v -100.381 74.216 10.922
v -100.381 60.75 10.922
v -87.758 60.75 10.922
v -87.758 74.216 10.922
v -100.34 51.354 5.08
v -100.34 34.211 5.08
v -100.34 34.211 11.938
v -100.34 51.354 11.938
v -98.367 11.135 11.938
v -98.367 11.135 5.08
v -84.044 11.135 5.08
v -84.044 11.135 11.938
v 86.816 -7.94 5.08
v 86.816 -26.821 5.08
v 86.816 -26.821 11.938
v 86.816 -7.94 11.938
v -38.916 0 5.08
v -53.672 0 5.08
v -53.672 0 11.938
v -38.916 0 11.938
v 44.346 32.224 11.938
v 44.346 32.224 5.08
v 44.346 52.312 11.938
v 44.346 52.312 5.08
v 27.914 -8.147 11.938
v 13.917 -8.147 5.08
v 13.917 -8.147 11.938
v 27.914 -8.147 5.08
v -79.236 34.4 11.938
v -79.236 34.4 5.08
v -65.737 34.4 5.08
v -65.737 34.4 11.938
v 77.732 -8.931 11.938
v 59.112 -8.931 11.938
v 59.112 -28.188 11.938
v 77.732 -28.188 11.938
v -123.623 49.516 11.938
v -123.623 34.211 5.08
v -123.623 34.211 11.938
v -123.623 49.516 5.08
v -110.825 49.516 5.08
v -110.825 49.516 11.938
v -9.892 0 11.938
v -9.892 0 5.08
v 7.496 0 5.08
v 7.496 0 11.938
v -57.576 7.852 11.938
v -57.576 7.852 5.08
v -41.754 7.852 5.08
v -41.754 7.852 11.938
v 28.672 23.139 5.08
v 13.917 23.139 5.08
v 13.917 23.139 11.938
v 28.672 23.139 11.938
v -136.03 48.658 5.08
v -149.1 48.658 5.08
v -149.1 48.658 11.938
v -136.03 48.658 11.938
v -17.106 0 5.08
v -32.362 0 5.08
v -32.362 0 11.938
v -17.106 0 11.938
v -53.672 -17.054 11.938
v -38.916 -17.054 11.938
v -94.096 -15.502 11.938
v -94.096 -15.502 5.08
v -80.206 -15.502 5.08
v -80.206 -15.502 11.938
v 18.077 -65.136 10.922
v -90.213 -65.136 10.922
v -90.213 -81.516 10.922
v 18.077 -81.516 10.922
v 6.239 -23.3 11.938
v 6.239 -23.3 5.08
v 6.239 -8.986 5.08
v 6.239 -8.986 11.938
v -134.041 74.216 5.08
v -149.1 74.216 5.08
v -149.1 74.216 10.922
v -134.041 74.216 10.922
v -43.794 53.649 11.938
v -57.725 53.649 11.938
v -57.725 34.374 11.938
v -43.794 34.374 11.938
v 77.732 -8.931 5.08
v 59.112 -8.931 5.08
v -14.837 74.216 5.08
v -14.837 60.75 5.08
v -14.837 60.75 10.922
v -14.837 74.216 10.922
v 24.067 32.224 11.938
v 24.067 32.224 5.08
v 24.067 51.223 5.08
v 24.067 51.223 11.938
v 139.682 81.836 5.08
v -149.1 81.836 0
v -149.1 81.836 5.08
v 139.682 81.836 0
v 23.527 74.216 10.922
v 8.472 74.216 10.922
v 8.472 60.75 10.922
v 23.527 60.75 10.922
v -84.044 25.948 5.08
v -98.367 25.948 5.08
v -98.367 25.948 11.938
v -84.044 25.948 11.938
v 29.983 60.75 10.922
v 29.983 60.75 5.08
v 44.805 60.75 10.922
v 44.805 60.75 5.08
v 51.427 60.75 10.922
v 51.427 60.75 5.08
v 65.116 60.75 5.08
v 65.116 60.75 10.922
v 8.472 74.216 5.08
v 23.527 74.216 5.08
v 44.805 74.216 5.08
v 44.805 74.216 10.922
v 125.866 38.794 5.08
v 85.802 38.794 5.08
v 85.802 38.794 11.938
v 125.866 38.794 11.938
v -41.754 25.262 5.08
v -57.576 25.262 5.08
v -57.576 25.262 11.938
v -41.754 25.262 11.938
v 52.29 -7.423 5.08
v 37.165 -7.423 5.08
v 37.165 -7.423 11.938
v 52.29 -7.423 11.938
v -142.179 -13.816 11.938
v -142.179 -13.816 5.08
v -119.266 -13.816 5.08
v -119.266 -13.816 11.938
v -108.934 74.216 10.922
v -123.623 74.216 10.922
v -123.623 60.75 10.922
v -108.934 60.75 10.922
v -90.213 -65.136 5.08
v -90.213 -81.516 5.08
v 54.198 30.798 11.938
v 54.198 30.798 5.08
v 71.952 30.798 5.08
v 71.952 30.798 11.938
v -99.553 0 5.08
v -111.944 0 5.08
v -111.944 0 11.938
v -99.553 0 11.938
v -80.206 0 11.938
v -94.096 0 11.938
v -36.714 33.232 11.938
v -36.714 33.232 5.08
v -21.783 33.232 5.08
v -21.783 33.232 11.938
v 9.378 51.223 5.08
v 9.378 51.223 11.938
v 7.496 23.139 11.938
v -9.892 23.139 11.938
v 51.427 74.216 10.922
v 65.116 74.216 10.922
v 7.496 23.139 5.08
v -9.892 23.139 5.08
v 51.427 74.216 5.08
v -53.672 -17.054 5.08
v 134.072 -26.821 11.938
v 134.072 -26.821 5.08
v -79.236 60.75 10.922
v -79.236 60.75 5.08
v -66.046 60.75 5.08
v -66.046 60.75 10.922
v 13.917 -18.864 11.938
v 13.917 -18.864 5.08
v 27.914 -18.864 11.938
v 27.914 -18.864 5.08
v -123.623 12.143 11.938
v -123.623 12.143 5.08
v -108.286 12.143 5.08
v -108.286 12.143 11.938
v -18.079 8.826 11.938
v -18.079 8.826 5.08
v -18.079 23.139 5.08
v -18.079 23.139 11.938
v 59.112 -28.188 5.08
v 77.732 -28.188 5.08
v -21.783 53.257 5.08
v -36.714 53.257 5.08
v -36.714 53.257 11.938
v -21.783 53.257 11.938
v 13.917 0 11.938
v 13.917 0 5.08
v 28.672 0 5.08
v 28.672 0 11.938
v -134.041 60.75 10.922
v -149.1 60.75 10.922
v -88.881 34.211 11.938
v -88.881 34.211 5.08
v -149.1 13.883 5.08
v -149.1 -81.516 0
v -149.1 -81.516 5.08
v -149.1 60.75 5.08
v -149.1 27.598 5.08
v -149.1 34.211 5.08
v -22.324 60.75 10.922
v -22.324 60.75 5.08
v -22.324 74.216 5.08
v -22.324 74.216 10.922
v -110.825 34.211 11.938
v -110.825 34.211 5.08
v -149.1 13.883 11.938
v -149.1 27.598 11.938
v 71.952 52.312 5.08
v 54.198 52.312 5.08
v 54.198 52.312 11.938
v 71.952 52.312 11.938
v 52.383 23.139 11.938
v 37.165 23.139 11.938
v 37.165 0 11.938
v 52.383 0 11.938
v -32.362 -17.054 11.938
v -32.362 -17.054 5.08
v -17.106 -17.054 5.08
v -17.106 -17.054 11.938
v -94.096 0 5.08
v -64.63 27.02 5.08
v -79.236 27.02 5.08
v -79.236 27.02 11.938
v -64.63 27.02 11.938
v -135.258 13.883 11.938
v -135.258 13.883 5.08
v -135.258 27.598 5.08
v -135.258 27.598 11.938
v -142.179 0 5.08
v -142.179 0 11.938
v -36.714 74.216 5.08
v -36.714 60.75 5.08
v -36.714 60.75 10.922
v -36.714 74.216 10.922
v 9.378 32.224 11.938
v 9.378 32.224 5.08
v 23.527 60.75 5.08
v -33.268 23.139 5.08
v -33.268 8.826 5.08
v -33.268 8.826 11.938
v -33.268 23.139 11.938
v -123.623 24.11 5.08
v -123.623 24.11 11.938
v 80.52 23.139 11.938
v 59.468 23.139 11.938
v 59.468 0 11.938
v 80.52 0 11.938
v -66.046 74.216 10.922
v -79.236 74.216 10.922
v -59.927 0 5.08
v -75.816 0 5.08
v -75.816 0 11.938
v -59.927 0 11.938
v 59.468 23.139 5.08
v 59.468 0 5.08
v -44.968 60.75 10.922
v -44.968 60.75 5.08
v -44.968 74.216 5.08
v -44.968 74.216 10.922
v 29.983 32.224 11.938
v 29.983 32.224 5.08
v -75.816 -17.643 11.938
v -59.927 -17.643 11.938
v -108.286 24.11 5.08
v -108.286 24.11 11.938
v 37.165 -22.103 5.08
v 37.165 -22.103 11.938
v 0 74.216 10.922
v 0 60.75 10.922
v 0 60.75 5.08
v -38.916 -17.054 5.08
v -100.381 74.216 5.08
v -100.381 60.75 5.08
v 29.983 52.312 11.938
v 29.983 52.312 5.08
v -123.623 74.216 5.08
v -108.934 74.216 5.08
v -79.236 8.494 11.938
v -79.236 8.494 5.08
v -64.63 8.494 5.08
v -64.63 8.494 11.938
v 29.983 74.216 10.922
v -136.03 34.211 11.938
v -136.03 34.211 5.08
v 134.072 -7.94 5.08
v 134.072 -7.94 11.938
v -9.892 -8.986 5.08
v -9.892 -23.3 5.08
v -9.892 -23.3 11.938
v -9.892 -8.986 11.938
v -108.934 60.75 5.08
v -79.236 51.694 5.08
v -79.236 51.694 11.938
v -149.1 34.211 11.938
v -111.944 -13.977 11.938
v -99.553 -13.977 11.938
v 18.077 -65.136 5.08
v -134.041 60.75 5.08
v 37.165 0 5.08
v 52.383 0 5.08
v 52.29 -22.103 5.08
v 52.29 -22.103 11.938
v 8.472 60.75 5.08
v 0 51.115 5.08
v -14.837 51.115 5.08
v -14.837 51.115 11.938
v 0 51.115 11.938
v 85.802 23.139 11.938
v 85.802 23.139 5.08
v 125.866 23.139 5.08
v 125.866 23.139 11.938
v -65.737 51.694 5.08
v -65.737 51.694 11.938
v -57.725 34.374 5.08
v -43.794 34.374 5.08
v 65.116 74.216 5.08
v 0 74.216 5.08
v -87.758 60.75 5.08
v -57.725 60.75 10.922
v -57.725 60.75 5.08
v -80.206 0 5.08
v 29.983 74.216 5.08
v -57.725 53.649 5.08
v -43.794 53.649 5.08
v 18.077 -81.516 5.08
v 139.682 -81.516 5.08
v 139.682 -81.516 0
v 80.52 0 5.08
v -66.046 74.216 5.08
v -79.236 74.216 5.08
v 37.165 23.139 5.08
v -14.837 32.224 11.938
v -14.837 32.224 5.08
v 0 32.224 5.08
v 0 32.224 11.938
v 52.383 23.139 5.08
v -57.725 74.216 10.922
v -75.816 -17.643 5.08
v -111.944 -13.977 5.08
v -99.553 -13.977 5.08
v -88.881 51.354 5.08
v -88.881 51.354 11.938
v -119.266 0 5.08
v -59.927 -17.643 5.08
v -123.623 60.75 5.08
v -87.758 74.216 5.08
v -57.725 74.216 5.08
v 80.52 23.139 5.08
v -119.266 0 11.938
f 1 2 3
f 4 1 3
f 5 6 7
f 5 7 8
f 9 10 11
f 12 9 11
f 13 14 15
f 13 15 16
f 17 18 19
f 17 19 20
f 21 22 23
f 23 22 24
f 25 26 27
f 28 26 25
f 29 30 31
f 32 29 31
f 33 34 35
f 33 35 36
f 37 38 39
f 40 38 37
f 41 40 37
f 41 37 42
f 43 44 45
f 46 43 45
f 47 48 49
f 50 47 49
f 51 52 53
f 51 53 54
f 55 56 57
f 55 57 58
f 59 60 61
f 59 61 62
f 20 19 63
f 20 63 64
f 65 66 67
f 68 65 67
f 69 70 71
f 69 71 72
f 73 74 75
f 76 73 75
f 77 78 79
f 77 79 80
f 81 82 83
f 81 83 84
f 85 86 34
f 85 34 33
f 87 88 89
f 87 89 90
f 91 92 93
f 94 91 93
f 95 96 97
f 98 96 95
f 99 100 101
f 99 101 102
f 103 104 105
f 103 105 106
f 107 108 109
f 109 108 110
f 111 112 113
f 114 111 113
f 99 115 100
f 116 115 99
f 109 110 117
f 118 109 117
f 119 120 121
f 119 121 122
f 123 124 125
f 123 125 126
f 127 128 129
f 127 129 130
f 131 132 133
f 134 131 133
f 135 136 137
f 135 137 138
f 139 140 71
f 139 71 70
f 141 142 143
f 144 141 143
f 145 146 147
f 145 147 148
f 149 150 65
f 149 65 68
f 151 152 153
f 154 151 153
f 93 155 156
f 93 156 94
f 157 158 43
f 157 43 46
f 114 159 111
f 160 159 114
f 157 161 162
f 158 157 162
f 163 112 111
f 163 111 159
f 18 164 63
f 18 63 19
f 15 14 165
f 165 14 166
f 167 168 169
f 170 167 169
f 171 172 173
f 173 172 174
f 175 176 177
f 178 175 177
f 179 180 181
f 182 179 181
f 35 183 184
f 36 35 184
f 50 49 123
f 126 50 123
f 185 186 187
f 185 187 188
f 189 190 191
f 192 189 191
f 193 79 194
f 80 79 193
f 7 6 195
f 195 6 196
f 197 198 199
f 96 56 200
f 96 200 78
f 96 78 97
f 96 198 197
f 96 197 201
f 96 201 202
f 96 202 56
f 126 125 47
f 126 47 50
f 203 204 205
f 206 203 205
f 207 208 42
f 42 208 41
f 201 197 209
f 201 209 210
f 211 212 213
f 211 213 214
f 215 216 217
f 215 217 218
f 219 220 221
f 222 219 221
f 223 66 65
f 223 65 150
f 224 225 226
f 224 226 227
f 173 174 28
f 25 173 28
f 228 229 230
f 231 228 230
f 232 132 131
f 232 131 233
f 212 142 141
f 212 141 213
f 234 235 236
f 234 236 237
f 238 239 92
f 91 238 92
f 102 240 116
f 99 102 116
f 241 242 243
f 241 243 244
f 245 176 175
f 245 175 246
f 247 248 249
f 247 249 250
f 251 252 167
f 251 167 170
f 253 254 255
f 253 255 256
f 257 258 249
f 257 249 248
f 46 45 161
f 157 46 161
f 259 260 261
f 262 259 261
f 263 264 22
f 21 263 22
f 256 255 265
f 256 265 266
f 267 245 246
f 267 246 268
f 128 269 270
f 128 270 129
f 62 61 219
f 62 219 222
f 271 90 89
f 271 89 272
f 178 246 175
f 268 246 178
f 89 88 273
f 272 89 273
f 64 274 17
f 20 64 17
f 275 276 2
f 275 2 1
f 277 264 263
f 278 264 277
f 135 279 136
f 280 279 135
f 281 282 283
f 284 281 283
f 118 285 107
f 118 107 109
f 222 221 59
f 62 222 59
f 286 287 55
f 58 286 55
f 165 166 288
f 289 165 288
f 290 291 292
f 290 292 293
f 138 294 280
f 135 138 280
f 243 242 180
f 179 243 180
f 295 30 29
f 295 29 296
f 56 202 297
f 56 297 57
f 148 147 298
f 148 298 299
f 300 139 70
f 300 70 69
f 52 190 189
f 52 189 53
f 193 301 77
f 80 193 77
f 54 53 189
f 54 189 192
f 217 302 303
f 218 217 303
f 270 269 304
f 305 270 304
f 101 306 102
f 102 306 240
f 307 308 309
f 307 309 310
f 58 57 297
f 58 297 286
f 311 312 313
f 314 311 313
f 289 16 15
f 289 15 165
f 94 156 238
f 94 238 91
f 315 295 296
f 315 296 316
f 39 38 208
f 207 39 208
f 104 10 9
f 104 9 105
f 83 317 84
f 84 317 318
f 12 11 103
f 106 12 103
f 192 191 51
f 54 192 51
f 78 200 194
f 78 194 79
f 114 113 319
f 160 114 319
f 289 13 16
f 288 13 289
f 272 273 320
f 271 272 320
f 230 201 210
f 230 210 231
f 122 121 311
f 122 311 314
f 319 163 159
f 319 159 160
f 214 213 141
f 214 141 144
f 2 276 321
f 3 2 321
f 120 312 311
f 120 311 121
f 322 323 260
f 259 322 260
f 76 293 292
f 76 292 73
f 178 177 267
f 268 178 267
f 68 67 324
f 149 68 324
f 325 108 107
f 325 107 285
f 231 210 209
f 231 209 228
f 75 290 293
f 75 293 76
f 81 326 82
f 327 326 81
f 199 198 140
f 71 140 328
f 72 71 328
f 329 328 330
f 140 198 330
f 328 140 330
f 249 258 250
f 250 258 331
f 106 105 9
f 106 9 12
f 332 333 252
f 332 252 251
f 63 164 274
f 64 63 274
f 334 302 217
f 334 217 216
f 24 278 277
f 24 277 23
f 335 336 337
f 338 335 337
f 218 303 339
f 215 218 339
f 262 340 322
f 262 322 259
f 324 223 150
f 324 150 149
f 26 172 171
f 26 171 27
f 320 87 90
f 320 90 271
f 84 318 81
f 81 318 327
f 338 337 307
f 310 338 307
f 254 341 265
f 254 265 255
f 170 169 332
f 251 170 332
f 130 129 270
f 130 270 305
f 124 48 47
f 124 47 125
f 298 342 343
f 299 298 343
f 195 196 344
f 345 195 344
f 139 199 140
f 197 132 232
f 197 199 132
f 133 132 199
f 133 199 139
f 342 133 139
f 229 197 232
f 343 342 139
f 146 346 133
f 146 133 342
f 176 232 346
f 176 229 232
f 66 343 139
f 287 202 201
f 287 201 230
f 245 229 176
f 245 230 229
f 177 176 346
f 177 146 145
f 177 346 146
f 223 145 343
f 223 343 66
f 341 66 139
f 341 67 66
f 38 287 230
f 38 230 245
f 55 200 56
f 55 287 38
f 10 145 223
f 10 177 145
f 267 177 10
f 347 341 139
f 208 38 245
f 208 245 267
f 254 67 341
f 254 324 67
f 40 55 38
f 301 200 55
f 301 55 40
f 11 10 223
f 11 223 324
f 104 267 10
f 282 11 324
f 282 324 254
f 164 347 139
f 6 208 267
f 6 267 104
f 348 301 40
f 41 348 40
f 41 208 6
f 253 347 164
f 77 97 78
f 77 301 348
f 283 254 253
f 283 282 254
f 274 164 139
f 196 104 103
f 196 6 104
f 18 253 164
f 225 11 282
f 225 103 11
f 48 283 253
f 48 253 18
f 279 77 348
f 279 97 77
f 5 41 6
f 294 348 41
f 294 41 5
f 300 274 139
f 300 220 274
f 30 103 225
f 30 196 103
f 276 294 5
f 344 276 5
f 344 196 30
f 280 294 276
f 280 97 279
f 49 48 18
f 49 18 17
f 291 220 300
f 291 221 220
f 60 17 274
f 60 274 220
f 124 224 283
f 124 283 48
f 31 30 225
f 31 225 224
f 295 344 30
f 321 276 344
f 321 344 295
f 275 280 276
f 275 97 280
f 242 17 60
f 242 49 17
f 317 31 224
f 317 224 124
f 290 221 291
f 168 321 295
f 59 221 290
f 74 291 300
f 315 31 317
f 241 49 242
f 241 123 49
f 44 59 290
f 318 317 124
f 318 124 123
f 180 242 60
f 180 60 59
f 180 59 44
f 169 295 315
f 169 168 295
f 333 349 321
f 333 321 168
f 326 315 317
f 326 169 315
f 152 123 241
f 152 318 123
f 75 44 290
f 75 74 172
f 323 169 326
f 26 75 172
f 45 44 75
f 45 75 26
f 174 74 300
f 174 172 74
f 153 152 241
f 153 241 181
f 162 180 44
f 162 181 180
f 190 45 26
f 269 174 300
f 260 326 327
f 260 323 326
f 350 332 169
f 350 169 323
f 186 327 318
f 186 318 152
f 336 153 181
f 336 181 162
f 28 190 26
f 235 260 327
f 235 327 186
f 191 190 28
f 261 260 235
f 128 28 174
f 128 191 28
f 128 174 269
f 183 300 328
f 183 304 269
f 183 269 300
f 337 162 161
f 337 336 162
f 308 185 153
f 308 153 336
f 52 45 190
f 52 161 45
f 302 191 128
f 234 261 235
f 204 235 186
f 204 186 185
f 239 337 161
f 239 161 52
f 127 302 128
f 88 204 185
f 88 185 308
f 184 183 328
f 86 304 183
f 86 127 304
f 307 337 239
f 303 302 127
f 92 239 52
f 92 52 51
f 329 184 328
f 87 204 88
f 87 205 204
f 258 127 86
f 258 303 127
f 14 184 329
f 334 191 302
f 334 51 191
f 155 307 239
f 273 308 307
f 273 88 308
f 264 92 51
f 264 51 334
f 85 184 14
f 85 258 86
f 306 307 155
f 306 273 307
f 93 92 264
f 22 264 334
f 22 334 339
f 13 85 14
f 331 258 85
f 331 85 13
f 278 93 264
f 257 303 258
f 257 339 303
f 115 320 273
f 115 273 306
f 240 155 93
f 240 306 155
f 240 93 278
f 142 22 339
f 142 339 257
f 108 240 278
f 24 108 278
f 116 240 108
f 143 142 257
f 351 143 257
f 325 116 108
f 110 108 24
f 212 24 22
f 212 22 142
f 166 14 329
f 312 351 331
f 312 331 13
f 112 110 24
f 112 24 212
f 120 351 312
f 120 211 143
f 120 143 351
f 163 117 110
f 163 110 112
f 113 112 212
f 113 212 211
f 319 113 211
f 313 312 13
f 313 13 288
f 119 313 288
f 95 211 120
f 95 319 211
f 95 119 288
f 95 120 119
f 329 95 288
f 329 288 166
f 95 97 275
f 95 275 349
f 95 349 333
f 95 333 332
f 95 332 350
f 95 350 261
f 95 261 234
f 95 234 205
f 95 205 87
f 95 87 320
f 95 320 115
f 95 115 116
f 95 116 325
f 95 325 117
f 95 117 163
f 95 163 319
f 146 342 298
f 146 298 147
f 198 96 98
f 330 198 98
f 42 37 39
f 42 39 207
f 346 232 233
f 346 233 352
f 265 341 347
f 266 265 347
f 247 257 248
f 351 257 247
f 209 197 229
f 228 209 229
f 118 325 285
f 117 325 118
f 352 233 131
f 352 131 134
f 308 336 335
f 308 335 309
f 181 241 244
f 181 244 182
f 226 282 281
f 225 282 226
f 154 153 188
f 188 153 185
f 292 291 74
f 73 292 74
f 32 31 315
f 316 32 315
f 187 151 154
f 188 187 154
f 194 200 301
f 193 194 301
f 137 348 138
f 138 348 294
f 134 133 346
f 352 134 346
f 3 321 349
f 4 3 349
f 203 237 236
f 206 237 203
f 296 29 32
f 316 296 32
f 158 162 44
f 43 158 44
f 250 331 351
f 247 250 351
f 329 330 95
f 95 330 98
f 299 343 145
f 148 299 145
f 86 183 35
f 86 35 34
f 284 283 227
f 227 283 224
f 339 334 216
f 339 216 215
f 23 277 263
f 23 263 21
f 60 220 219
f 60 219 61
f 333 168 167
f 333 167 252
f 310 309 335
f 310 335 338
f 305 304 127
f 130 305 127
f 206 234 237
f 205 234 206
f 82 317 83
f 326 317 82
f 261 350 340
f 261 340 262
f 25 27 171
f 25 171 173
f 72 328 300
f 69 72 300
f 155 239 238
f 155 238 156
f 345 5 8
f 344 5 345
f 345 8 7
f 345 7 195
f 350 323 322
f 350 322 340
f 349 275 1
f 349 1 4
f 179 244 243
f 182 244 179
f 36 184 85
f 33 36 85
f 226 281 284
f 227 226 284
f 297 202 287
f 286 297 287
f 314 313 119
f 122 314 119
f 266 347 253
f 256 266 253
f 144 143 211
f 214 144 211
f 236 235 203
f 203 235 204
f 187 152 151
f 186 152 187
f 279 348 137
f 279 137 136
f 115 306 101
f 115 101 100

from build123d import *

# Parameters (mm, degrees)
F0_W     = 288.782075
F0_H     = 163.352266
F1_DEPTH = 5.08
F2_W     = 15.059188
F2_H     = 13.465754
F2_W_2   = 14.688864
F2_W_3   = 12.622907
F2_W_4   = 13.189614
F2_W_5   = 12.756806
F2_W_6   = 14.389988
F2_W_7   = 14.837095
F2_W_8   = 15.054709
F2_W_9   = 14.822775
F2_W_10  = 13.689365
F3_DEPTH = 5.842
F4_W     = 108.290506
F4_H     = 16.379602
F5_DEPTH = 5.842
F6_W     = 13.069794
F6_H     = 14.447321
F6_W_2   = 12.797505
F6_H_2   = 15.304588
F6_W_3   = 11.458419
F6_H_3   = 17.143417
F6_W_4   = 13.49812
F6_H_4   = 17.293982
F6_W_5   = 13.930906
F6_H_5   = 19.27505
F6_W_6   = 14.930427
F6_H_6   = 20.024683
F6_W_7   = 14.837095
F6_H_7   = 18.891268
F6_W_8   = 14.688871
F6_H_8   = 18.99891
F6_W_9   = 14.363708
F6_H_9   = 20.088118
F6_W_10  = 17.754339
F6_H_10  = 21.514323
F6_W_11  = 13.842166
F6_H_11  = 13.715633
F6_W_12  = 15.336946
F6_H_12  = 11.966504
F6_W_13  = 14.323011
F6_H_13  = 14.813163
F6_W_14  = 14.605261
F6_H_14  = 18.525428
F6_W_15  = 15.82228
F6_H_15  = 17.409948
F6_W_16  = 15.188619
F6_H_16  = 14.313415
F6_W_17  = 22.91315
F6_H_17  = 13.81641
F6_W_18  = 9.892102
F6_H_18  = 16.320752
F6_W_19  = 14.755823
F6_H_19  = 23.138981
F6_W_20  = 15.218579
F6_W_21  = 21.051738
F6_W_22  = 40.063784
F6_H_20  = 15.655063
F6_W_23  = 47.256365
F6_H_21  = 18.881655
F6_W_24  = 12.390971
F6_H_22  = 13.976591
F6_W_25  = 13.890229
F6_H_23  = 15.502113
F6_W_26  = 15.889235
F6_H_24  = 17.643357
F6_W_27  = 14.755819
F6_H_25  = 17.053898
F6_W_28  = 15.255572
F6_W_29  = 16.130783
F6_H_26  = 14.313408
F6_W_30  = 13.997871
F6_H_27  = 10.71711
F6_W_31  = 15.125354
F6_H_28  = 14.679253
F6_W_32  = 18.619925
F6_H_29  = 19.2571
F7_DEPTH = 6.858


with BuildPart() as f1:
    # F0 (on Top) → F1 (new body)
    with BuildSketch(Plane.XY):
        with Locations((-4.708923, 0.160061)):
            Rectangle(F0_W, F0_H)
    extrude(amount=F1_DEPTH)

    # F2 (on face) → F3 (join)
    with BuildSketch(Plane.XY.offset(5.08)):
        with Locations((-141.570367, 67.483317)):
            Rectangle(F2_W, F2_H)
        with Locations((-116.278112, 67.483317)):
            Rectangle(F2_W_2, F2_H)
        with Locations((-94.069093, 67.483317)):
            Rectangle(F2_W_3, F2_H)
        with Locations((-72.640784, 67.483317)):
            Rectangle(F2_W_4, F2_H)
        with Locations((-51.346382, 67.483317)):
            Rectangle(F2_W_5, F2_H)
        with Locations((-29.518751, 67.483317)):
            Rectangle(F2_W_6, F2_H)
        with Locations((-7.418547, 67.483317)):
            Rectangle(F2_W_7, F2_H)
        with Locations((15.999209, 67.483317)):
            Rectangle(F2_W_8, F2_H)
        with Locations((37.394049, 67.483317)):
            Rectangle(F2_W_9, F2_H)
        with Locations((58.271186, 67.483317)):
            Rectangle(F2_W_10, F2_H)
    extrude(amount=F3_DEPTH)

    # F4 (on face) → F5 (join)
    with BuildSketch(Plane.XY.offset(5.08)):
        with Locations((-36.067889, -73.326271)):
            Rectangle(F4_W, F4_H)
    extrude(amount=F5_DEPTH)

    # F6 (on face) → F7 (join)
    with BuildSketch(Plane.XY.offset(5.08)):
        with Locations((-142.565064, 41.434703)):
            Rectangle(F6_W, F6_H)
        with Locations((-117.223791, 41.863337)):
            Rectangle(F6_W_2, F6_H_2)
        with Locations((-94.610658, 42.782751)):
            Rectangle(F6_W_3, F6_H_3)
        with Locations((-72.486531, 43.047041)):
            Rectangle(F6_W_4, F6_H_4)
        with Locations((-50.759332, 44.011319)):
            Rectangle(F6_W_5, F6_H_5)
        with Locations((-29.248531, 43.244389)):
            Rectangle(F6_W_6, F6_H_6)
        with Locations((-7.418547, 41.669853)):
            Rectangle(F6_W_7, F6_H_7)
        with Locations((16.722579, 41.723674)):
            Rectangle(F6_W_8, F6_H_8)
        with Locations((37.164516, 42.268278)):
            Rectangle(F6_W_9, F6_H_9)
        with Locations((63.075055, 41.555175)):
            Rectangle(F6_W_10, F6_H_10)
        with Locations((-142.178878, 20.740474)):
            Rectangle(F6_W_11, F6_H_11)
        with Locations((-115.954071, 18.126391)):
            Rectangle(F6_W_12, F6_H_12)
        with Locations((-91.205612, 18.541897)):
            Rectangle(F6_W_13, F6_H_13)
        with Locations((-71.932961, 17.757031)):
            Rectangle(F6_W_14, F6_H_14)
        with Locations((-49.665319, 16.557304)):
            Rectangle(F6_W_15, F6_H_15)
        with Locations((-25.673699, 15.982273)):
            Rectangle(F6_W_16, F6_H_16)
        with Locations((-130.722303, -6.908205)):
            Rectangle(F6_W_17, F6_H_17)
        with Locations((-4.946051, 14.978605)):
            Rectangle(F6_W_18, F6_H_18)
        Polygon((7.496388, 23.138981), (0, 23.138981), (0, 6.818229), (-9.892102, 6.818229), (-9.892102, 0), (7.496388, 0), align=None)
        with Locations((21.294507, 11.56949)):
            Rectangle(F6_W_19, F6_H_19)
        with Locations((44.773805, 11.56949)):
            Rectangle(F6_W_20, F6_H_19)
        with Locations((69.993904, 11.56949)):
            Rectangle(F6_W_21, F6_H_19)
        with Locations((105.833657, 30.966513)):
            Rectangle(F6_W_22, F6_H_20)
        with Locations((110.443867, -17.380646)):
            Rectangle(F6_W_23, F6_H_21)
        with Locations((-105.748556, -6.988295)):
            Rectangle(F6_W_24, F6_H_22)
        with Locations((-87.151367, -7.751056)):
            Rectangle(F6_W_25, F6_H_23)
        with Locations((-67.871508, -8.821678)):
            Rectangle(F6_W_26, F6_H_24)
        with Locations((-46.293752, -8.526949)):
            Rectangle(F6_W_27, F6_H_25)
        with Locations((-24.733937, -8.526949)):
            Rectangle(F6_W_28, F6_H_25)
        with Locations((-1.82671, -16.142811)):
            Rectangle(F6_W_29, F6_H_26)
        with Locations((20.91553, -13.505332)):
            Rectangle(F6_W_30, F6_H_27)
        with Locations((44.727193, -14.763038)):
            Rectangle(F6_W_31, F6_H_28)
        with Locations((68.421774, -18.559552)):
            Rectangle(F6_W_32, F6_H_29)
    extrude(amount=F7_DEPTH)


solid = f1.part
